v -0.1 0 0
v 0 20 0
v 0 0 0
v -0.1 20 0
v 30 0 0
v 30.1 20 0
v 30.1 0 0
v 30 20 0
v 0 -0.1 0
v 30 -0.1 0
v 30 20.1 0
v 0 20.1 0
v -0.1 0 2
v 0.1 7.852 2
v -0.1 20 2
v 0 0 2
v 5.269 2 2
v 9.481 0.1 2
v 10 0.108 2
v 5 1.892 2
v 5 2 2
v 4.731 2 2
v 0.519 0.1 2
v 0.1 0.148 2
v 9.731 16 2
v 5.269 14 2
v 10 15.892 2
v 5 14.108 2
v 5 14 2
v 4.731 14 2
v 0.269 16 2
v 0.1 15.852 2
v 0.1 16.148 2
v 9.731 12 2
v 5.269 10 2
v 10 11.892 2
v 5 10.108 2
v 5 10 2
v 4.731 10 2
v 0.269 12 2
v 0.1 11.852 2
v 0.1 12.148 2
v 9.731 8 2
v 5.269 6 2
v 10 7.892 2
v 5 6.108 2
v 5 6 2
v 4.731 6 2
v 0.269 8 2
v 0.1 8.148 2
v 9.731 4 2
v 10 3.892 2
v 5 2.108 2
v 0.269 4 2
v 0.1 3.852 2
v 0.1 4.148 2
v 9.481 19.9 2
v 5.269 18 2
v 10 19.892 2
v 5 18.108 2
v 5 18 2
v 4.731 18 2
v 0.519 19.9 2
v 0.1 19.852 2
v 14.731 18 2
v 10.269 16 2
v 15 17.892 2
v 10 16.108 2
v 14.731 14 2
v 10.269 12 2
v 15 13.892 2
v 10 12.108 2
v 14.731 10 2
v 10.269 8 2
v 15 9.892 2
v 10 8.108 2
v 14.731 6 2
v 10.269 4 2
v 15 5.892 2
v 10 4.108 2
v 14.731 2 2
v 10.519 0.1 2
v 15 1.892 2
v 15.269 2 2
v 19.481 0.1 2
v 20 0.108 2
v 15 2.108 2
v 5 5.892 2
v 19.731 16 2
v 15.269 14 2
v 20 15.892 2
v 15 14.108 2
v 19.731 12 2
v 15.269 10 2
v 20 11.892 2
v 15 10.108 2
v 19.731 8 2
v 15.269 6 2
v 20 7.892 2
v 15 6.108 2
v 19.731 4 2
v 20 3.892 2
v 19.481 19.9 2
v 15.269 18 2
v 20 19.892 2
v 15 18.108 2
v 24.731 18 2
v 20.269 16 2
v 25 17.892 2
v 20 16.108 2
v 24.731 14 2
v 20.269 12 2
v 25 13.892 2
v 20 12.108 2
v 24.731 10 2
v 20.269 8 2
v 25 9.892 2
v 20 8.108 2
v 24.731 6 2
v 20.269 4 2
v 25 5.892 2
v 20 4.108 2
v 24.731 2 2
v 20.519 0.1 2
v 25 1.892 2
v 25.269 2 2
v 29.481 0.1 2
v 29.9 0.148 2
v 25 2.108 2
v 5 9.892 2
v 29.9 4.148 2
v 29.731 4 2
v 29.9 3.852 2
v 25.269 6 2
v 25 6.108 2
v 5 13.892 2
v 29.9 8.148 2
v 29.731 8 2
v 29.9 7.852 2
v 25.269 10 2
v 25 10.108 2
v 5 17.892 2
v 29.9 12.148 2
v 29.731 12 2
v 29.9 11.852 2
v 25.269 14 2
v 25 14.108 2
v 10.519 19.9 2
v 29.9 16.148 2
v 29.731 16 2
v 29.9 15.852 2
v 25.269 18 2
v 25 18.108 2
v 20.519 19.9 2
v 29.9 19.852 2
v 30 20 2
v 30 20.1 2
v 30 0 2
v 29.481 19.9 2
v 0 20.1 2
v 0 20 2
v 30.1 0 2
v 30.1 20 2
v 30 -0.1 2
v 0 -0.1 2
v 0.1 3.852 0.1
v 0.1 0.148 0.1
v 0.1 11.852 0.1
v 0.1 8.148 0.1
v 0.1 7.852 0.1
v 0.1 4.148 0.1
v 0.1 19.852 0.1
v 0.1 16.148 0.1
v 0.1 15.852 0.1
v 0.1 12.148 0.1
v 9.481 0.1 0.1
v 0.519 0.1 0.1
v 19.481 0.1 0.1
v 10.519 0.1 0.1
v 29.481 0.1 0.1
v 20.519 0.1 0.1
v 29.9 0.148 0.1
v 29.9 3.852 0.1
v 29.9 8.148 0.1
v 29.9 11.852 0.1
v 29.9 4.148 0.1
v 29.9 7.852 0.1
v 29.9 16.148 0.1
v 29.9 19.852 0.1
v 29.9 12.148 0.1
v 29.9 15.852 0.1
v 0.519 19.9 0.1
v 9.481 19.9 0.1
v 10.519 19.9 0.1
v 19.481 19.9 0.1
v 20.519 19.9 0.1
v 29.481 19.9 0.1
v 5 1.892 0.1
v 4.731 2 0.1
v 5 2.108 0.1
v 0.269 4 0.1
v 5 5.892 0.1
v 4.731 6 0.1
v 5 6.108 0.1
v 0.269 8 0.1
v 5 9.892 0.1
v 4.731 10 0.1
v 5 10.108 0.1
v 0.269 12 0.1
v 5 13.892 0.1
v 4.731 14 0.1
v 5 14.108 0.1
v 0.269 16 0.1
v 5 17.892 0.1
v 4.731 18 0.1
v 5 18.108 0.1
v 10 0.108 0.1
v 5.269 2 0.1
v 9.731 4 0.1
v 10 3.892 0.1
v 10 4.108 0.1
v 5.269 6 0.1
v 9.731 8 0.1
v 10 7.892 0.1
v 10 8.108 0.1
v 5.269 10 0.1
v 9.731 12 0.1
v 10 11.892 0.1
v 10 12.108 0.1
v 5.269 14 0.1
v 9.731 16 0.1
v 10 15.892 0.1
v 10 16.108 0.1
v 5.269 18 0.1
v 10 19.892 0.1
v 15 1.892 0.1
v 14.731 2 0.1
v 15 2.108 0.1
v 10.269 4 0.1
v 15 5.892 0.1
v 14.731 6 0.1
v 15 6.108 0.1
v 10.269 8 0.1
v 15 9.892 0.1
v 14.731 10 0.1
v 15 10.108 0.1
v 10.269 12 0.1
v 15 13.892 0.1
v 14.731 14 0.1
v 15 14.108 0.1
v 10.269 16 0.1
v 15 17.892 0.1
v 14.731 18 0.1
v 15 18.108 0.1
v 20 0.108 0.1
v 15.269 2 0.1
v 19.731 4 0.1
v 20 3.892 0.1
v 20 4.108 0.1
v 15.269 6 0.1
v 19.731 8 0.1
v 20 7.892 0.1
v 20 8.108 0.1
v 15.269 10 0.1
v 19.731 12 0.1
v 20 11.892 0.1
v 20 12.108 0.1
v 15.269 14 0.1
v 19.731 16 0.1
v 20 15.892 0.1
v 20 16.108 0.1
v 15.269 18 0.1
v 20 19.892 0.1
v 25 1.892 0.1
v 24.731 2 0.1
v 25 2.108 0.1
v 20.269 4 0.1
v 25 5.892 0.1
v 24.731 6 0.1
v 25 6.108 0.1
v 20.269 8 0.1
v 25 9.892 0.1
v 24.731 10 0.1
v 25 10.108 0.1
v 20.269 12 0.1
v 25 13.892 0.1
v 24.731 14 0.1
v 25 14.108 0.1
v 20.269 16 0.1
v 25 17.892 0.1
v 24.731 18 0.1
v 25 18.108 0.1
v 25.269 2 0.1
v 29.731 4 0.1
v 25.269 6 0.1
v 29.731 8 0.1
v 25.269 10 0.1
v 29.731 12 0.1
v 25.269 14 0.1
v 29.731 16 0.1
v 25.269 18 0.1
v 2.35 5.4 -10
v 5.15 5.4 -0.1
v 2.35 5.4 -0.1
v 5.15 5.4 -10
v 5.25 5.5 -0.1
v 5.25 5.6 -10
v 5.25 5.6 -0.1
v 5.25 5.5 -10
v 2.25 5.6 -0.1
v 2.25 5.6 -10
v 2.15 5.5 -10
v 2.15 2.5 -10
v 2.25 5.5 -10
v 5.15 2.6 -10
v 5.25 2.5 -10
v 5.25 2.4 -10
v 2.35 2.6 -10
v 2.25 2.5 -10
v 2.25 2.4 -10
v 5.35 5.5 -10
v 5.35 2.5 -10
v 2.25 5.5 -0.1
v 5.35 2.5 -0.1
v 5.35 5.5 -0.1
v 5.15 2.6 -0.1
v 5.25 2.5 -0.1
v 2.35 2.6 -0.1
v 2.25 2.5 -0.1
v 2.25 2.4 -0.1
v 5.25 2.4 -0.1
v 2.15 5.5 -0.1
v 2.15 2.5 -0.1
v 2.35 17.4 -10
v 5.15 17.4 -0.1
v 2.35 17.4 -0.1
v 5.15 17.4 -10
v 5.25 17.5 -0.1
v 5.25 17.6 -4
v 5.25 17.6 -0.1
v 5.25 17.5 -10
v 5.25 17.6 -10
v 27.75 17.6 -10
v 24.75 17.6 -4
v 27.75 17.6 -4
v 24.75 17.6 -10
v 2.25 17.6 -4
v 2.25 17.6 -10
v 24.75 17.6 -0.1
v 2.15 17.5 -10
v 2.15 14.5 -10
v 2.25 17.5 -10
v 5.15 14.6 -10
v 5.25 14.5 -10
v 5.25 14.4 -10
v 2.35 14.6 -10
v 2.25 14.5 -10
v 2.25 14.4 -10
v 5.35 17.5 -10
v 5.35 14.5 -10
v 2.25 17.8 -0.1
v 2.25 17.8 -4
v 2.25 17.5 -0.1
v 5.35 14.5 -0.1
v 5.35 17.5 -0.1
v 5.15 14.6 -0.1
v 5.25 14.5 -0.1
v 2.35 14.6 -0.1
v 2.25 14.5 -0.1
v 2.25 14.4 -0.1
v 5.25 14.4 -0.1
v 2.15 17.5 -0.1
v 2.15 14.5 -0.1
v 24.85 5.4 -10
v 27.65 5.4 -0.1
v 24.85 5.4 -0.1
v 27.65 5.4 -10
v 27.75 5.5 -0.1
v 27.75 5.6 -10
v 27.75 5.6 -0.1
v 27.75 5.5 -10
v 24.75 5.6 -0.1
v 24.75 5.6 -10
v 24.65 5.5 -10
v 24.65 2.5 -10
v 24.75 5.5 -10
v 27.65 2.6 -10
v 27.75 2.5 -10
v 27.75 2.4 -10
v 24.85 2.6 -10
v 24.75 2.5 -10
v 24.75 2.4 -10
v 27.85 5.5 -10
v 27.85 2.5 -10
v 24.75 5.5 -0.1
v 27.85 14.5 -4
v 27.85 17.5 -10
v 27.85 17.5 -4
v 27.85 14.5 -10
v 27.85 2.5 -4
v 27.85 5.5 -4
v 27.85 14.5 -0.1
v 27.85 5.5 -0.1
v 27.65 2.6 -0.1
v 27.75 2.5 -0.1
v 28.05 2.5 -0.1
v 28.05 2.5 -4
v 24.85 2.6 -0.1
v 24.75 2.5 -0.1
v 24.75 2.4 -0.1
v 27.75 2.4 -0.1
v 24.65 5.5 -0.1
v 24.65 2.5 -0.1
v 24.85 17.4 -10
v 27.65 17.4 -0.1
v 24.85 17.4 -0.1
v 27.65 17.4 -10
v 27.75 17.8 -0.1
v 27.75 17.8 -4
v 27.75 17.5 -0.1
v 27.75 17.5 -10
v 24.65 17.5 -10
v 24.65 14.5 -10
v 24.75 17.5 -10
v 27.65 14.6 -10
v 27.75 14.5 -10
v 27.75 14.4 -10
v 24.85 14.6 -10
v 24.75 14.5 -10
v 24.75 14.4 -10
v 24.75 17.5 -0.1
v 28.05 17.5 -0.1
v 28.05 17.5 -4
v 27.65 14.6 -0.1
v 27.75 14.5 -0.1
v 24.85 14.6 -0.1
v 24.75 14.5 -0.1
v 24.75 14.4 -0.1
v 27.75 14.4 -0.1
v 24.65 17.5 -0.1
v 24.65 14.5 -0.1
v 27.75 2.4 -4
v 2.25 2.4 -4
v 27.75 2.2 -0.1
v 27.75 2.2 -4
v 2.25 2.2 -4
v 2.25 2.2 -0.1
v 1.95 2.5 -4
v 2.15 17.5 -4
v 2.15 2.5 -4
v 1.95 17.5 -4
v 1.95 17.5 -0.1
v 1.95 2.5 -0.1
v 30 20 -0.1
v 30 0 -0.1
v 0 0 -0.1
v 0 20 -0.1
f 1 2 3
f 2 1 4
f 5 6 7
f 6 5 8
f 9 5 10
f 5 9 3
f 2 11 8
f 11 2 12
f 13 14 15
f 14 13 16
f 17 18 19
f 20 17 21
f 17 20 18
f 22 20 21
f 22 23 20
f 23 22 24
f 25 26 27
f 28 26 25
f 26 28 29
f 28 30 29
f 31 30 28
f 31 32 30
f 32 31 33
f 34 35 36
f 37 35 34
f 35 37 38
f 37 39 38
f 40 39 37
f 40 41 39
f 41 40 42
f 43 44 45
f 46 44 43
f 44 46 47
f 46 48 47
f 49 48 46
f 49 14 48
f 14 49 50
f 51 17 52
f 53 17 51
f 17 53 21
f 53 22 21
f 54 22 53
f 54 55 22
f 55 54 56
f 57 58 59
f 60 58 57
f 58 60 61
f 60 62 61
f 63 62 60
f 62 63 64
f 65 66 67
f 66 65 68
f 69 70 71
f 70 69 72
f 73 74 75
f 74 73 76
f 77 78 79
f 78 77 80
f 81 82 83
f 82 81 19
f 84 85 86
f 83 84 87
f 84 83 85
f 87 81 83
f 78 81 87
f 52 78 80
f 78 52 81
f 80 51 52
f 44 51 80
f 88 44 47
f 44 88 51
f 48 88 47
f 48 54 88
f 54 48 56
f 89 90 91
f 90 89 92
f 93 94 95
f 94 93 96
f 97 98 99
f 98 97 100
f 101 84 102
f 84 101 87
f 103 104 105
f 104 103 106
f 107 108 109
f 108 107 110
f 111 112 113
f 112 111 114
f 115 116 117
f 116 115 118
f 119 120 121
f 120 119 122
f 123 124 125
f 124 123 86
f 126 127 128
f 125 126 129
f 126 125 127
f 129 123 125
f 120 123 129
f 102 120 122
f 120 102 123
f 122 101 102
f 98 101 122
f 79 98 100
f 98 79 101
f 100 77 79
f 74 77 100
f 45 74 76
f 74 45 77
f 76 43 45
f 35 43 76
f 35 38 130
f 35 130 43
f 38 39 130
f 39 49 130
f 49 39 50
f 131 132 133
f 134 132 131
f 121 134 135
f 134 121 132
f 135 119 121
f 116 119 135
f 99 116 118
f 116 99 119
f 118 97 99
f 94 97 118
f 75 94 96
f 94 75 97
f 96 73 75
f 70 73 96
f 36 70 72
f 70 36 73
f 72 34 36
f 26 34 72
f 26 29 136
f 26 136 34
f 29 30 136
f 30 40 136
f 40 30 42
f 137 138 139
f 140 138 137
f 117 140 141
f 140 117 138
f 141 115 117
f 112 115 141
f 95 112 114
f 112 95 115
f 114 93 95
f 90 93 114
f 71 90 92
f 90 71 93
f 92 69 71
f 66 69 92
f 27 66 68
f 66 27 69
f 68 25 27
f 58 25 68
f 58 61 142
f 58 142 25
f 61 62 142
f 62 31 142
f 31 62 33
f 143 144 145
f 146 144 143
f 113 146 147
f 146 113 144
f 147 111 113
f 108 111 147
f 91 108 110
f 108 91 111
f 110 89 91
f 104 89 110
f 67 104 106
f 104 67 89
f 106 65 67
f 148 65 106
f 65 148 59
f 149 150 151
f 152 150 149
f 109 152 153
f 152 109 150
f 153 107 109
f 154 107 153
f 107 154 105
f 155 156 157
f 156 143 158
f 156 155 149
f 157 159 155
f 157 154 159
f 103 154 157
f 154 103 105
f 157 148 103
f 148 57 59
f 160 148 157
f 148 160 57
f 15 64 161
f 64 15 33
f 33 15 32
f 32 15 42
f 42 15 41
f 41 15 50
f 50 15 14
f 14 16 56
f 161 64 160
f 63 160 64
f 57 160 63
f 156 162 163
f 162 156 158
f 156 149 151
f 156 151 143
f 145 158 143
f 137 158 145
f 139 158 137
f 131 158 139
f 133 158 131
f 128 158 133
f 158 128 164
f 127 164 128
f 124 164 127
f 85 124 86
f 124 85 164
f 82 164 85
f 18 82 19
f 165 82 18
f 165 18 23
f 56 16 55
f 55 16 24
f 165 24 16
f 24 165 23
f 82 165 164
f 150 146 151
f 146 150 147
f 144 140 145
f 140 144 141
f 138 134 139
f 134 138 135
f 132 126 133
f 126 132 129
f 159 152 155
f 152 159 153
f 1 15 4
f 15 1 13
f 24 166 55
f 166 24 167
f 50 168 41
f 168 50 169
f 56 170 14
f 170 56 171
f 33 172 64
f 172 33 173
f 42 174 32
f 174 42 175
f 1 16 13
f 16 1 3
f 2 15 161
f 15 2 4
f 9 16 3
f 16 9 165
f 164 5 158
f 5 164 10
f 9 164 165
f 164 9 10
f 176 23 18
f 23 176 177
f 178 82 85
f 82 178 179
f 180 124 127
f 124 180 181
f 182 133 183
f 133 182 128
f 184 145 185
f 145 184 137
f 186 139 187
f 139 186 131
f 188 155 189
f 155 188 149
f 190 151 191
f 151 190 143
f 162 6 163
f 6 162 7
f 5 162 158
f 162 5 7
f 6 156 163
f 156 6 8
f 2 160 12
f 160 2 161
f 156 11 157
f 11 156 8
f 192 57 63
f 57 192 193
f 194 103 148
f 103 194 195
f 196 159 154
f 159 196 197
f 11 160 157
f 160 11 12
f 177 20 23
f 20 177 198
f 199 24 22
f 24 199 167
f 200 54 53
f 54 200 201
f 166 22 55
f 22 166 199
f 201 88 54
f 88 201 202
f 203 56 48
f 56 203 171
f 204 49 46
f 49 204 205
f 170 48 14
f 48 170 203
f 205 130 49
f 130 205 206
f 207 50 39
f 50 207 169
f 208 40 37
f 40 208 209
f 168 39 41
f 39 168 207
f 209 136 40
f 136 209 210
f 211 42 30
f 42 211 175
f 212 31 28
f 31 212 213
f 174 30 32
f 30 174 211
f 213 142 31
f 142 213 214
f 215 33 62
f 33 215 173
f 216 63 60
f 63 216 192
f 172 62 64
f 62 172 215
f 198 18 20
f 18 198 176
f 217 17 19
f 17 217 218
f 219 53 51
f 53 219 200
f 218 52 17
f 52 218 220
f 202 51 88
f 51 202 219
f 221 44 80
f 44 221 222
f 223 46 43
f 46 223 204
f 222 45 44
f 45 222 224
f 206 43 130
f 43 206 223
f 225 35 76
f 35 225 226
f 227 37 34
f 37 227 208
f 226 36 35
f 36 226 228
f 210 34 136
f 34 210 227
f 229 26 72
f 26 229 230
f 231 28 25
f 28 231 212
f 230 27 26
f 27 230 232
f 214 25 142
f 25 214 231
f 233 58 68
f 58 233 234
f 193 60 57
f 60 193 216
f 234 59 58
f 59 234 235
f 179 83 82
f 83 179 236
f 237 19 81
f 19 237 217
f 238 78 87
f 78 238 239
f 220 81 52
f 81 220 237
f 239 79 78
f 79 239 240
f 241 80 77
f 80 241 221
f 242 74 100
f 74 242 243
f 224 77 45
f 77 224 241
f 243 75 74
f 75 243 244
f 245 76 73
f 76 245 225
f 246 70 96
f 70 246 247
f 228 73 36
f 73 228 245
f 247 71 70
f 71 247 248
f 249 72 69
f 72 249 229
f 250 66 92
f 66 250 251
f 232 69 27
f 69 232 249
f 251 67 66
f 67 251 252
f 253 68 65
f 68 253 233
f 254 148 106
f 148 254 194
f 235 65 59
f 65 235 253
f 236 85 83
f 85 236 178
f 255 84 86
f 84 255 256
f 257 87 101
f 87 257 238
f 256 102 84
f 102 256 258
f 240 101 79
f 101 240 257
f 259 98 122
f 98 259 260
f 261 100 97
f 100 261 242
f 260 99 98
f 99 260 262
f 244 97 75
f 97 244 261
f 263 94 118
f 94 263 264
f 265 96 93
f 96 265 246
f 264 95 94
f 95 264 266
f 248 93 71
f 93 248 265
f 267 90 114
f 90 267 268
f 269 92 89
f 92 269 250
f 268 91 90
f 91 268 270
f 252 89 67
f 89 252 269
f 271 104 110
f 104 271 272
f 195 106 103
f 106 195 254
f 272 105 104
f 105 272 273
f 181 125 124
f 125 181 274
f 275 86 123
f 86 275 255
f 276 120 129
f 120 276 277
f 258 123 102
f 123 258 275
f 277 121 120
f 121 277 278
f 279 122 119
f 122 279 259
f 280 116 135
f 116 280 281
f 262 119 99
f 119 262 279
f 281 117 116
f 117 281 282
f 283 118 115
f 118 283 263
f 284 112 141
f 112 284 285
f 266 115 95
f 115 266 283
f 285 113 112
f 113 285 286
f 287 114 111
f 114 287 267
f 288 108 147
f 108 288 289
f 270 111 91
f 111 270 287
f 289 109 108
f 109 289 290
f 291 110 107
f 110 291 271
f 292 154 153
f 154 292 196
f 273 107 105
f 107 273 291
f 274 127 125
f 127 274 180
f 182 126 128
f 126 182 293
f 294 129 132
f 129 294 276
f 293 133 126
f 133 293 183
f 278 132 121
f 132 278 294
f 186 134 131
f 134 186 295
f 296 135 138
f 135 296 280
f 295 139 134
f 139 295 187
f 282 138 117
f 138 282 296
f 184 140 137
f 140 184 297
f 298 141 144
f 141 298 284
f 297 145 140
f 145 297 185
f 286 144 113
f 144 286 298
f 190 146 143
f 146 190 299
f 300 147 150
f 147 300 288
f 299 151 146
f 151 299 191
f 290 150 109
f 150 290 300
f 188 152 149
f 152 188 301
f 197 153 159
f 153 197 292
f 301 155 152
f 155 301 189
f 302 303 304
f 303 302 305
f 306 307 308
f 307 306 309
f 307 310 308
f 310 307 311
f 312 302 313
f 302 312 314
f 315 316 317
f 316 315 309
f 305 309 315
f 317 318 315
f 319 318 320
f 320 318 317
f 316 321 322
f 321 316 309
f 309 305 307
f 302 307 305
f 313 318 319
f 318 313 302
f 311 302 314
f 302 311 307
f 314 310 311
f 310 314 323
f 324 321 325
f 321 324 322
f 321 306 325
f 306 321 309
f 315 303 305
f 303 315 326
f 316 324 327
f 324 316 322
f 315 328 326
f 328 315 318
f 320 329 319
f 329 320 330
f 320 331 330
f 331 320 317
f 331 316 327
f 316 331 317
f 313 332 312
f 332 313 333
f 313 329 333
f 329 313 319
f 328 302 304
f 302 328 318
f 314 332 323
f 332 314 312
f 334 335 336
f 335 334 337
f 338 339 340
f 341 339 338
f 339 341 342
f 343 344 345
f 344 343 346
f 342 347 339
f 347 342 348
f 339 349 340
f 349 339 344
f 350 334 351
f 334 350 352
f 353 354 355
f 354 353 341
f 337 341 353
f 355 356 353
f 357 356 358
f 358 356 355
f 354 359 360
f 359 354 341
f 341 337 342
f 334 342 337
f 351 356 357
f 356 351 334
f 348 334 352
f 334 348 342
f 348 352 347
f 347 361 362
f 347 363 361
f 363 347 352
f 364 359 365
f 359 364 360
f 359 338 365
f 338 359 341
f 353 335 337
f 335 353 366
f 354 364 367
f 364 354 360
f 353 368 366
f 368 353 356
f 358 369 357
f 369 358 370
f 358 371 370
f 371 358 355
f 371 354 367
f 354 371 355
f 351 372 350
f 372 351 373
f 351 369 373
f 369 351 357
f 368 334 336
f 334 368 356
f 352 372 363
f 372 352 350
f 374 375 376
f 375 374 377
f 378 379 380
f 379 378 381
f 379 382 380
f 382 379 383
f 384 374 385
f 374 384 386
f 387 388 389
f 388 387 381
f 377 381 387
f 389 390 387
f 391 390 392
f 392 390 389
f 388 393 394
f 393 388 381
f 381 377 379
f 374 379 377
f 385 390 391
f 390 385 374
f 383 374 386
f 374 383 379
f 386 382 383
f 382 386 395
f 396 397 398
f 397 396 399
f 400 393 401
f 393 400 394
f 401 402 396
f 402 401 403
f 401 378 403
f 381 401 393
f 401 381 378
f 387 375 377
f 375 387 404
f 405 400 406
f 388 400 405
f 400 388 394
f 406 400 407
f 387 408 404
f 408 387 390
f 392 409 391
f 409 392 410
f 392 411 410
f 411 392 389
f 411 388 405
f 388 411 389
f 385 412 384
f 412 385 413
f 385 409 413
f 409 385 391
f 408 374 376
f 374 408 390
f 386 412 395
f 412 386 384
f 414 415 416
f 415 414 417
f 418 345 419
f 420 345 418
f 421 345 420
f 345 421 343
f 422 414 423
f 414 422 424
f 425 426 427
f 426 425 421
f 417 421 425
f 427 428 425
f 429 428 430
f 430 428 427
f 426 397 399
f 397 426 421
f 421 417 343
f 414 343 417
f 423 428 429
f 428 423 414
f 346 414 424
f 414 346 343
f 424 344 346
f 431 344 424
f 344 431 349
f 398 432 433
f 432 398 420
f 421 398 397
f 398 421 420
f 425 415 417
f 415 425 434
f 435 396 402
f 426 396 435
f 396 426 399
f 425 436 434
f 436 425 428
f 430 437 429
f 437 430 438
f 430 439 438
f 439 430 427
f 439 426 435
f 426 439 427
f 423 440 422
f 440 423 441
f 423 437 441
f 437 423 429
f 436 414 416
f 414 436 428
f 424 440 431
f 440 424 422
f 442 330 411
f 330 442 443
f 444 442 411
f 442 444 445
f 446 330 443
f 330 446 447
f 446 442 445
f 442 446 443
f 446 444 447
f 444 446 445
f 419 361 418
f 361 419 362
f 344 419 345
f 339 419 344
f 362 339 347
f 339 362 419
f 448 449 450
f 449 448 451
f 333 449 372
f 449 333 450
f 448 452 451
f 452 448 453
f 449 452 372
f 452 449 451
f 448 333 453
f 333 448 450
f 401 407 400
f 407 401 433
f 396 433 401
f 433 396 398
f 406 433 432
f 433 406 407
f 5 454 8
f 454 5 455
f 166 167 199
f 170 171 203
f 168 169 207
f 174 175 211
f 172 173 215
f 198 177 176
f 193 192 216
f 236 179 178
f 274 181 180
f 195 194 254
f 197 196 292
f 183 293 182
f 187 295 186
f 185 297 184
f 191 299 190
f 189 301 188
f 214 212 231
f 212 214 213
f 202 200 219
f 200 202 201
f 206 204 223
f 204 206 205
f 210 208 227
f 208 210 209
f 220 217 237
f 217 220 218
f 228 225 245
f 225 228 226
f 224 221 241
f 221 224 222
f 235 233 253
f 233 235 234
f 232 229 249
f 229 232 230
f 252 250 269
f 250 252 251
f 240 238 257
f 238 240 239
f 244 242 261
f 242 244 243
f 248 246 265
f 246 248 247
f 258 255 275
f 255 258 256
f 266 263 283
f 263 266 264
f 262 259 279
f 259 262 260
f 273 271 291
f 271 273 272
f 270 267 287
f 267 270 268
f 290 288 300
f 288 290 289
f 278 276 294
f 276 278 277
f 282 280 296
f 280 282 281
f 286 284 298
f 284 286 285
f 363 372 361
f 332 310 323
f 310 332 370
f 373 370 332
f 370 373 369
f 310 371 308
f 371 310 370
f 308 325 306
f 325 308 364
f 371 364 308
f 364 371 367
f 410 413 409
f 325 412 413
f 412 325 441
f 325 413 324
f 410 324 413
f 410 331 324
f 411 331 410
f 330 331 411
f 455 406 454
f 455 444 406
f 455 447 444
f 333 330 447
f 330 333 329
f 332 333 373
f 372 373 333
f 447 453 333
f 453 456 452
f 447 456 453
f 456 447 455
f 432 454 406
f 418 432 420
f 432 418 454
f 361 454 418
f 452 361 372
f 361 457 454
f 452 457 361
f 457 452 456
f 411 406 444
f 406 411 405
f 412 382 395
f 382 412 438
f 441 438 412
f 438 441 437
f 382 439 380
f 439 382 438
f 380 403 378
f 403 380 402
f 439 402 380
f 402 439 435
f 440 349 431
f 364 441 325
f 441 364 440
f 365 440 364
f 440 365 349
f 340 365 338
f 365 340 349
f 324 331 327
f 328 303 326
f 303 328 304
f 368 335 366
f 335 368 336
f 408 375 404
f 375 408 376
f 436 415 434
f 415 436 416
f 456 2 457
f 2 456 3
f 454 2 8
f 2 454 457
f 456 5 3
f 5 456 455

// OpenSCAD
// file: library/sheet.scad
//-----------------------------------------------------------------------------
// conventions:
//  * x -- width
//  * y -- height
//  * z -- thickness
//  * sheets start at a corner, thickness centered
//-----------------------------------------------------------------------------

function thickness() = 0.2;

//-----------------------------------------------------------------------------

module trapezium(wt, wb, h, thick = thickness()) {
  a = wb - wt;
  b = h;
  rot = atan(a / b);

  cut_h = h / cos(rot) * 1.1;
  // cut_w doesn't need to be calculated; it's enough to use max(wt,wb)
  // (an overkill, but who cares?)

  w = max(wb, wt); // longer of the widths

  difference() {
    sheet(w, h, thick);

    translate([wb, 0, 0])
    rotate([0, 0, rot])
    sheet(w, cut_h, thick * 2);
  }
}

//-----------------------------------------------------------------------------

// direction of border adds `adjust' to specified width and height in the
// direction, so no plane is left uncovered
module cut(w = 2, h = 2, thick = thickness(), adjust = 0.01,
           top = false, down = false, left = false, right = false) {
  cut_w = (left && right) ? w + 2 * adjust : (left || right) ? w + adjust : w;
  cut_h = (top  && down)  ? h + 2 * adjust : (top  || down)  ? h + adjust : h;
  cut_x = left ? -adjust : 0;
  cut_y = down ? -adjust : 0;

  translate([cut_x, cut_y, -thick])
  cube([cut_w, cut_h, thick * 2]);
}

//-----------------------------------------------------------------------------

// TODO: orientation
module sheet(w = 10, h = 10, thick = thickness()) {
  translate([0, 0, -thick / 2])
  cube([w, h, thick]);
}

//-----------------------------------------------------------------------------
// vim:ft=openscad
// main file
//----------------------------------------------------------------------------

use <library/sheet.scad>;

//----------------------------------------------------------------------------

table_width = 30;
table_height = 20;
table_thickness = 2;

fill_zig_width = table_width / 6;
fill_zig_step = 4;

leg_offset_x = table_width / 8;
leg_offset_y = table_height / 5;

//----------------------------------------------------------------------------

// top and bottom plates
sheet(w = table_width, h = table_height);
translate([0, 0, table_thickness])
%sheet(w = table_width, h = table_height);

// borders
union() {
  rotate([0, -90, 0]) sheet(h = table_height, w = table_thickness);
  rotate([90,  0, 0]) sheet(h = table_thickness, w = table_width);

  translate([table_width, 0, 0])
  rotate([0, -90, 0]) sheet(h = table_height, w = table_thickness);
  translate([0, table_height, 0])
  rotate([90,  0, 0]) sheet(h = table_thickness, w = table_width);
}

// filling with zigzag
// FIXME: problems with model when table_width is not an even multiple of
// fill_zig_width
for (i = [0 : 2 : (table_width / fill_zig_width - 1)]) {
  translate([i * fill_zig_width, 0, 0])
  zigzag(w = fill_zig_width, step = fill_zig_step,
         h = table_height, thick = table_thickness);

  translate([(i + 2) * fill_zig_width, 0, 0])
  mirror([1, 0, 0])
  zigzag(w = fill_zig_width, step = fill_zig_step,
         h = table_height, thick = table_thickness);
}

// legs
for (x = [leg_offset_x, table_width  - leg_offset_x],
     y = [leg_offset_y, table_height - leg_offset_y]) {
  translate([x, y, 0]) table_leg(d = 3, h = 10);
}

// legs support
color("green") {
  // bottom
  translate([0, -thickness(), 0])
  translate([leg_offset_x - 3 / 2, leg_offset_y - 3 / 2, 0])
  rotate([-90, 0, 0])
  sheet(w = table_width - 2 * leg_offset_x + (3 / 2) * 2, h = 4);

  // top
  translate([0,  thickness(), 0])
  translate([leg_offset_x - 3 / 2, table_height - (leg_offset_y - 3 / 2), 0])
  rotate([-90, 0, 0])
  sheet(w = table_width - 2 * leg_offset_x + (3 / 2) * 2, h = 4);

  // left
  translate([-thickness(), 0, 0])
  translate([leg_offset_x - 3 / 2, leg_offset_y - 3 / 2, 0])
  rotate([0, 90, 0])
  sheet(h = table_height - 2 * leg_offset_y + (3 / 2) * 2, w = 4);

  // right
  translate([ thickness(), 0, 0])
  translate([table_width - (leg_offset_x - 3 / 2), leg_offset_y - 3 / 2, 0])
  rotate([0, 90, 0])
  sheet(h = table_height - 2 * leg_offset_y + (3 / 2) * 2, w = 4);
}

//----------------------------------------------------------------------------

// NOTE: the leg is centered
module table_leg(d, h) {
  translate([-d / 2, -d / 2, 0]) {
    rotate([-90, 0,   0]) sheet(w = d, h = h);
    rotate([-90, 0,  90]) sheet(w = d, h = h);
    translate([d, d, 0]) {
      rotate([-90, 0, 180]) sheet(w = d, h = h);
      rotate([-90, 0, -90]) sheet(w = d, h = h);
    }
  }
}

module zigzag(w, h, thick, step) {
  zig_angle = atan((step / 2) / w);
  zig_length = step / 2 / sin(zig_angle);

  // remaining part of (step / 2) length; 1 if more than this remains to fill
  function remaining(filled) = min(1, (h - filled) / (step / 2));

  for (i = [0 : h / step]) {
    translate([0, step * i, 0]) {
      // this is zig
      rotate([90, 0, zig_angle])
      sheet(w = remaining(step * i) * zig_length, h = thick);

      // this is zag
      translate([w, step / 2, 0])
      rotate([90, 0, 180 - zig_angle])
      sheet(w = remaining(step * i + step / 2) * zig_length, h = thick);
    }
  }
}

//----------------------------------------------------------------------------
// vim:ft=openscad
